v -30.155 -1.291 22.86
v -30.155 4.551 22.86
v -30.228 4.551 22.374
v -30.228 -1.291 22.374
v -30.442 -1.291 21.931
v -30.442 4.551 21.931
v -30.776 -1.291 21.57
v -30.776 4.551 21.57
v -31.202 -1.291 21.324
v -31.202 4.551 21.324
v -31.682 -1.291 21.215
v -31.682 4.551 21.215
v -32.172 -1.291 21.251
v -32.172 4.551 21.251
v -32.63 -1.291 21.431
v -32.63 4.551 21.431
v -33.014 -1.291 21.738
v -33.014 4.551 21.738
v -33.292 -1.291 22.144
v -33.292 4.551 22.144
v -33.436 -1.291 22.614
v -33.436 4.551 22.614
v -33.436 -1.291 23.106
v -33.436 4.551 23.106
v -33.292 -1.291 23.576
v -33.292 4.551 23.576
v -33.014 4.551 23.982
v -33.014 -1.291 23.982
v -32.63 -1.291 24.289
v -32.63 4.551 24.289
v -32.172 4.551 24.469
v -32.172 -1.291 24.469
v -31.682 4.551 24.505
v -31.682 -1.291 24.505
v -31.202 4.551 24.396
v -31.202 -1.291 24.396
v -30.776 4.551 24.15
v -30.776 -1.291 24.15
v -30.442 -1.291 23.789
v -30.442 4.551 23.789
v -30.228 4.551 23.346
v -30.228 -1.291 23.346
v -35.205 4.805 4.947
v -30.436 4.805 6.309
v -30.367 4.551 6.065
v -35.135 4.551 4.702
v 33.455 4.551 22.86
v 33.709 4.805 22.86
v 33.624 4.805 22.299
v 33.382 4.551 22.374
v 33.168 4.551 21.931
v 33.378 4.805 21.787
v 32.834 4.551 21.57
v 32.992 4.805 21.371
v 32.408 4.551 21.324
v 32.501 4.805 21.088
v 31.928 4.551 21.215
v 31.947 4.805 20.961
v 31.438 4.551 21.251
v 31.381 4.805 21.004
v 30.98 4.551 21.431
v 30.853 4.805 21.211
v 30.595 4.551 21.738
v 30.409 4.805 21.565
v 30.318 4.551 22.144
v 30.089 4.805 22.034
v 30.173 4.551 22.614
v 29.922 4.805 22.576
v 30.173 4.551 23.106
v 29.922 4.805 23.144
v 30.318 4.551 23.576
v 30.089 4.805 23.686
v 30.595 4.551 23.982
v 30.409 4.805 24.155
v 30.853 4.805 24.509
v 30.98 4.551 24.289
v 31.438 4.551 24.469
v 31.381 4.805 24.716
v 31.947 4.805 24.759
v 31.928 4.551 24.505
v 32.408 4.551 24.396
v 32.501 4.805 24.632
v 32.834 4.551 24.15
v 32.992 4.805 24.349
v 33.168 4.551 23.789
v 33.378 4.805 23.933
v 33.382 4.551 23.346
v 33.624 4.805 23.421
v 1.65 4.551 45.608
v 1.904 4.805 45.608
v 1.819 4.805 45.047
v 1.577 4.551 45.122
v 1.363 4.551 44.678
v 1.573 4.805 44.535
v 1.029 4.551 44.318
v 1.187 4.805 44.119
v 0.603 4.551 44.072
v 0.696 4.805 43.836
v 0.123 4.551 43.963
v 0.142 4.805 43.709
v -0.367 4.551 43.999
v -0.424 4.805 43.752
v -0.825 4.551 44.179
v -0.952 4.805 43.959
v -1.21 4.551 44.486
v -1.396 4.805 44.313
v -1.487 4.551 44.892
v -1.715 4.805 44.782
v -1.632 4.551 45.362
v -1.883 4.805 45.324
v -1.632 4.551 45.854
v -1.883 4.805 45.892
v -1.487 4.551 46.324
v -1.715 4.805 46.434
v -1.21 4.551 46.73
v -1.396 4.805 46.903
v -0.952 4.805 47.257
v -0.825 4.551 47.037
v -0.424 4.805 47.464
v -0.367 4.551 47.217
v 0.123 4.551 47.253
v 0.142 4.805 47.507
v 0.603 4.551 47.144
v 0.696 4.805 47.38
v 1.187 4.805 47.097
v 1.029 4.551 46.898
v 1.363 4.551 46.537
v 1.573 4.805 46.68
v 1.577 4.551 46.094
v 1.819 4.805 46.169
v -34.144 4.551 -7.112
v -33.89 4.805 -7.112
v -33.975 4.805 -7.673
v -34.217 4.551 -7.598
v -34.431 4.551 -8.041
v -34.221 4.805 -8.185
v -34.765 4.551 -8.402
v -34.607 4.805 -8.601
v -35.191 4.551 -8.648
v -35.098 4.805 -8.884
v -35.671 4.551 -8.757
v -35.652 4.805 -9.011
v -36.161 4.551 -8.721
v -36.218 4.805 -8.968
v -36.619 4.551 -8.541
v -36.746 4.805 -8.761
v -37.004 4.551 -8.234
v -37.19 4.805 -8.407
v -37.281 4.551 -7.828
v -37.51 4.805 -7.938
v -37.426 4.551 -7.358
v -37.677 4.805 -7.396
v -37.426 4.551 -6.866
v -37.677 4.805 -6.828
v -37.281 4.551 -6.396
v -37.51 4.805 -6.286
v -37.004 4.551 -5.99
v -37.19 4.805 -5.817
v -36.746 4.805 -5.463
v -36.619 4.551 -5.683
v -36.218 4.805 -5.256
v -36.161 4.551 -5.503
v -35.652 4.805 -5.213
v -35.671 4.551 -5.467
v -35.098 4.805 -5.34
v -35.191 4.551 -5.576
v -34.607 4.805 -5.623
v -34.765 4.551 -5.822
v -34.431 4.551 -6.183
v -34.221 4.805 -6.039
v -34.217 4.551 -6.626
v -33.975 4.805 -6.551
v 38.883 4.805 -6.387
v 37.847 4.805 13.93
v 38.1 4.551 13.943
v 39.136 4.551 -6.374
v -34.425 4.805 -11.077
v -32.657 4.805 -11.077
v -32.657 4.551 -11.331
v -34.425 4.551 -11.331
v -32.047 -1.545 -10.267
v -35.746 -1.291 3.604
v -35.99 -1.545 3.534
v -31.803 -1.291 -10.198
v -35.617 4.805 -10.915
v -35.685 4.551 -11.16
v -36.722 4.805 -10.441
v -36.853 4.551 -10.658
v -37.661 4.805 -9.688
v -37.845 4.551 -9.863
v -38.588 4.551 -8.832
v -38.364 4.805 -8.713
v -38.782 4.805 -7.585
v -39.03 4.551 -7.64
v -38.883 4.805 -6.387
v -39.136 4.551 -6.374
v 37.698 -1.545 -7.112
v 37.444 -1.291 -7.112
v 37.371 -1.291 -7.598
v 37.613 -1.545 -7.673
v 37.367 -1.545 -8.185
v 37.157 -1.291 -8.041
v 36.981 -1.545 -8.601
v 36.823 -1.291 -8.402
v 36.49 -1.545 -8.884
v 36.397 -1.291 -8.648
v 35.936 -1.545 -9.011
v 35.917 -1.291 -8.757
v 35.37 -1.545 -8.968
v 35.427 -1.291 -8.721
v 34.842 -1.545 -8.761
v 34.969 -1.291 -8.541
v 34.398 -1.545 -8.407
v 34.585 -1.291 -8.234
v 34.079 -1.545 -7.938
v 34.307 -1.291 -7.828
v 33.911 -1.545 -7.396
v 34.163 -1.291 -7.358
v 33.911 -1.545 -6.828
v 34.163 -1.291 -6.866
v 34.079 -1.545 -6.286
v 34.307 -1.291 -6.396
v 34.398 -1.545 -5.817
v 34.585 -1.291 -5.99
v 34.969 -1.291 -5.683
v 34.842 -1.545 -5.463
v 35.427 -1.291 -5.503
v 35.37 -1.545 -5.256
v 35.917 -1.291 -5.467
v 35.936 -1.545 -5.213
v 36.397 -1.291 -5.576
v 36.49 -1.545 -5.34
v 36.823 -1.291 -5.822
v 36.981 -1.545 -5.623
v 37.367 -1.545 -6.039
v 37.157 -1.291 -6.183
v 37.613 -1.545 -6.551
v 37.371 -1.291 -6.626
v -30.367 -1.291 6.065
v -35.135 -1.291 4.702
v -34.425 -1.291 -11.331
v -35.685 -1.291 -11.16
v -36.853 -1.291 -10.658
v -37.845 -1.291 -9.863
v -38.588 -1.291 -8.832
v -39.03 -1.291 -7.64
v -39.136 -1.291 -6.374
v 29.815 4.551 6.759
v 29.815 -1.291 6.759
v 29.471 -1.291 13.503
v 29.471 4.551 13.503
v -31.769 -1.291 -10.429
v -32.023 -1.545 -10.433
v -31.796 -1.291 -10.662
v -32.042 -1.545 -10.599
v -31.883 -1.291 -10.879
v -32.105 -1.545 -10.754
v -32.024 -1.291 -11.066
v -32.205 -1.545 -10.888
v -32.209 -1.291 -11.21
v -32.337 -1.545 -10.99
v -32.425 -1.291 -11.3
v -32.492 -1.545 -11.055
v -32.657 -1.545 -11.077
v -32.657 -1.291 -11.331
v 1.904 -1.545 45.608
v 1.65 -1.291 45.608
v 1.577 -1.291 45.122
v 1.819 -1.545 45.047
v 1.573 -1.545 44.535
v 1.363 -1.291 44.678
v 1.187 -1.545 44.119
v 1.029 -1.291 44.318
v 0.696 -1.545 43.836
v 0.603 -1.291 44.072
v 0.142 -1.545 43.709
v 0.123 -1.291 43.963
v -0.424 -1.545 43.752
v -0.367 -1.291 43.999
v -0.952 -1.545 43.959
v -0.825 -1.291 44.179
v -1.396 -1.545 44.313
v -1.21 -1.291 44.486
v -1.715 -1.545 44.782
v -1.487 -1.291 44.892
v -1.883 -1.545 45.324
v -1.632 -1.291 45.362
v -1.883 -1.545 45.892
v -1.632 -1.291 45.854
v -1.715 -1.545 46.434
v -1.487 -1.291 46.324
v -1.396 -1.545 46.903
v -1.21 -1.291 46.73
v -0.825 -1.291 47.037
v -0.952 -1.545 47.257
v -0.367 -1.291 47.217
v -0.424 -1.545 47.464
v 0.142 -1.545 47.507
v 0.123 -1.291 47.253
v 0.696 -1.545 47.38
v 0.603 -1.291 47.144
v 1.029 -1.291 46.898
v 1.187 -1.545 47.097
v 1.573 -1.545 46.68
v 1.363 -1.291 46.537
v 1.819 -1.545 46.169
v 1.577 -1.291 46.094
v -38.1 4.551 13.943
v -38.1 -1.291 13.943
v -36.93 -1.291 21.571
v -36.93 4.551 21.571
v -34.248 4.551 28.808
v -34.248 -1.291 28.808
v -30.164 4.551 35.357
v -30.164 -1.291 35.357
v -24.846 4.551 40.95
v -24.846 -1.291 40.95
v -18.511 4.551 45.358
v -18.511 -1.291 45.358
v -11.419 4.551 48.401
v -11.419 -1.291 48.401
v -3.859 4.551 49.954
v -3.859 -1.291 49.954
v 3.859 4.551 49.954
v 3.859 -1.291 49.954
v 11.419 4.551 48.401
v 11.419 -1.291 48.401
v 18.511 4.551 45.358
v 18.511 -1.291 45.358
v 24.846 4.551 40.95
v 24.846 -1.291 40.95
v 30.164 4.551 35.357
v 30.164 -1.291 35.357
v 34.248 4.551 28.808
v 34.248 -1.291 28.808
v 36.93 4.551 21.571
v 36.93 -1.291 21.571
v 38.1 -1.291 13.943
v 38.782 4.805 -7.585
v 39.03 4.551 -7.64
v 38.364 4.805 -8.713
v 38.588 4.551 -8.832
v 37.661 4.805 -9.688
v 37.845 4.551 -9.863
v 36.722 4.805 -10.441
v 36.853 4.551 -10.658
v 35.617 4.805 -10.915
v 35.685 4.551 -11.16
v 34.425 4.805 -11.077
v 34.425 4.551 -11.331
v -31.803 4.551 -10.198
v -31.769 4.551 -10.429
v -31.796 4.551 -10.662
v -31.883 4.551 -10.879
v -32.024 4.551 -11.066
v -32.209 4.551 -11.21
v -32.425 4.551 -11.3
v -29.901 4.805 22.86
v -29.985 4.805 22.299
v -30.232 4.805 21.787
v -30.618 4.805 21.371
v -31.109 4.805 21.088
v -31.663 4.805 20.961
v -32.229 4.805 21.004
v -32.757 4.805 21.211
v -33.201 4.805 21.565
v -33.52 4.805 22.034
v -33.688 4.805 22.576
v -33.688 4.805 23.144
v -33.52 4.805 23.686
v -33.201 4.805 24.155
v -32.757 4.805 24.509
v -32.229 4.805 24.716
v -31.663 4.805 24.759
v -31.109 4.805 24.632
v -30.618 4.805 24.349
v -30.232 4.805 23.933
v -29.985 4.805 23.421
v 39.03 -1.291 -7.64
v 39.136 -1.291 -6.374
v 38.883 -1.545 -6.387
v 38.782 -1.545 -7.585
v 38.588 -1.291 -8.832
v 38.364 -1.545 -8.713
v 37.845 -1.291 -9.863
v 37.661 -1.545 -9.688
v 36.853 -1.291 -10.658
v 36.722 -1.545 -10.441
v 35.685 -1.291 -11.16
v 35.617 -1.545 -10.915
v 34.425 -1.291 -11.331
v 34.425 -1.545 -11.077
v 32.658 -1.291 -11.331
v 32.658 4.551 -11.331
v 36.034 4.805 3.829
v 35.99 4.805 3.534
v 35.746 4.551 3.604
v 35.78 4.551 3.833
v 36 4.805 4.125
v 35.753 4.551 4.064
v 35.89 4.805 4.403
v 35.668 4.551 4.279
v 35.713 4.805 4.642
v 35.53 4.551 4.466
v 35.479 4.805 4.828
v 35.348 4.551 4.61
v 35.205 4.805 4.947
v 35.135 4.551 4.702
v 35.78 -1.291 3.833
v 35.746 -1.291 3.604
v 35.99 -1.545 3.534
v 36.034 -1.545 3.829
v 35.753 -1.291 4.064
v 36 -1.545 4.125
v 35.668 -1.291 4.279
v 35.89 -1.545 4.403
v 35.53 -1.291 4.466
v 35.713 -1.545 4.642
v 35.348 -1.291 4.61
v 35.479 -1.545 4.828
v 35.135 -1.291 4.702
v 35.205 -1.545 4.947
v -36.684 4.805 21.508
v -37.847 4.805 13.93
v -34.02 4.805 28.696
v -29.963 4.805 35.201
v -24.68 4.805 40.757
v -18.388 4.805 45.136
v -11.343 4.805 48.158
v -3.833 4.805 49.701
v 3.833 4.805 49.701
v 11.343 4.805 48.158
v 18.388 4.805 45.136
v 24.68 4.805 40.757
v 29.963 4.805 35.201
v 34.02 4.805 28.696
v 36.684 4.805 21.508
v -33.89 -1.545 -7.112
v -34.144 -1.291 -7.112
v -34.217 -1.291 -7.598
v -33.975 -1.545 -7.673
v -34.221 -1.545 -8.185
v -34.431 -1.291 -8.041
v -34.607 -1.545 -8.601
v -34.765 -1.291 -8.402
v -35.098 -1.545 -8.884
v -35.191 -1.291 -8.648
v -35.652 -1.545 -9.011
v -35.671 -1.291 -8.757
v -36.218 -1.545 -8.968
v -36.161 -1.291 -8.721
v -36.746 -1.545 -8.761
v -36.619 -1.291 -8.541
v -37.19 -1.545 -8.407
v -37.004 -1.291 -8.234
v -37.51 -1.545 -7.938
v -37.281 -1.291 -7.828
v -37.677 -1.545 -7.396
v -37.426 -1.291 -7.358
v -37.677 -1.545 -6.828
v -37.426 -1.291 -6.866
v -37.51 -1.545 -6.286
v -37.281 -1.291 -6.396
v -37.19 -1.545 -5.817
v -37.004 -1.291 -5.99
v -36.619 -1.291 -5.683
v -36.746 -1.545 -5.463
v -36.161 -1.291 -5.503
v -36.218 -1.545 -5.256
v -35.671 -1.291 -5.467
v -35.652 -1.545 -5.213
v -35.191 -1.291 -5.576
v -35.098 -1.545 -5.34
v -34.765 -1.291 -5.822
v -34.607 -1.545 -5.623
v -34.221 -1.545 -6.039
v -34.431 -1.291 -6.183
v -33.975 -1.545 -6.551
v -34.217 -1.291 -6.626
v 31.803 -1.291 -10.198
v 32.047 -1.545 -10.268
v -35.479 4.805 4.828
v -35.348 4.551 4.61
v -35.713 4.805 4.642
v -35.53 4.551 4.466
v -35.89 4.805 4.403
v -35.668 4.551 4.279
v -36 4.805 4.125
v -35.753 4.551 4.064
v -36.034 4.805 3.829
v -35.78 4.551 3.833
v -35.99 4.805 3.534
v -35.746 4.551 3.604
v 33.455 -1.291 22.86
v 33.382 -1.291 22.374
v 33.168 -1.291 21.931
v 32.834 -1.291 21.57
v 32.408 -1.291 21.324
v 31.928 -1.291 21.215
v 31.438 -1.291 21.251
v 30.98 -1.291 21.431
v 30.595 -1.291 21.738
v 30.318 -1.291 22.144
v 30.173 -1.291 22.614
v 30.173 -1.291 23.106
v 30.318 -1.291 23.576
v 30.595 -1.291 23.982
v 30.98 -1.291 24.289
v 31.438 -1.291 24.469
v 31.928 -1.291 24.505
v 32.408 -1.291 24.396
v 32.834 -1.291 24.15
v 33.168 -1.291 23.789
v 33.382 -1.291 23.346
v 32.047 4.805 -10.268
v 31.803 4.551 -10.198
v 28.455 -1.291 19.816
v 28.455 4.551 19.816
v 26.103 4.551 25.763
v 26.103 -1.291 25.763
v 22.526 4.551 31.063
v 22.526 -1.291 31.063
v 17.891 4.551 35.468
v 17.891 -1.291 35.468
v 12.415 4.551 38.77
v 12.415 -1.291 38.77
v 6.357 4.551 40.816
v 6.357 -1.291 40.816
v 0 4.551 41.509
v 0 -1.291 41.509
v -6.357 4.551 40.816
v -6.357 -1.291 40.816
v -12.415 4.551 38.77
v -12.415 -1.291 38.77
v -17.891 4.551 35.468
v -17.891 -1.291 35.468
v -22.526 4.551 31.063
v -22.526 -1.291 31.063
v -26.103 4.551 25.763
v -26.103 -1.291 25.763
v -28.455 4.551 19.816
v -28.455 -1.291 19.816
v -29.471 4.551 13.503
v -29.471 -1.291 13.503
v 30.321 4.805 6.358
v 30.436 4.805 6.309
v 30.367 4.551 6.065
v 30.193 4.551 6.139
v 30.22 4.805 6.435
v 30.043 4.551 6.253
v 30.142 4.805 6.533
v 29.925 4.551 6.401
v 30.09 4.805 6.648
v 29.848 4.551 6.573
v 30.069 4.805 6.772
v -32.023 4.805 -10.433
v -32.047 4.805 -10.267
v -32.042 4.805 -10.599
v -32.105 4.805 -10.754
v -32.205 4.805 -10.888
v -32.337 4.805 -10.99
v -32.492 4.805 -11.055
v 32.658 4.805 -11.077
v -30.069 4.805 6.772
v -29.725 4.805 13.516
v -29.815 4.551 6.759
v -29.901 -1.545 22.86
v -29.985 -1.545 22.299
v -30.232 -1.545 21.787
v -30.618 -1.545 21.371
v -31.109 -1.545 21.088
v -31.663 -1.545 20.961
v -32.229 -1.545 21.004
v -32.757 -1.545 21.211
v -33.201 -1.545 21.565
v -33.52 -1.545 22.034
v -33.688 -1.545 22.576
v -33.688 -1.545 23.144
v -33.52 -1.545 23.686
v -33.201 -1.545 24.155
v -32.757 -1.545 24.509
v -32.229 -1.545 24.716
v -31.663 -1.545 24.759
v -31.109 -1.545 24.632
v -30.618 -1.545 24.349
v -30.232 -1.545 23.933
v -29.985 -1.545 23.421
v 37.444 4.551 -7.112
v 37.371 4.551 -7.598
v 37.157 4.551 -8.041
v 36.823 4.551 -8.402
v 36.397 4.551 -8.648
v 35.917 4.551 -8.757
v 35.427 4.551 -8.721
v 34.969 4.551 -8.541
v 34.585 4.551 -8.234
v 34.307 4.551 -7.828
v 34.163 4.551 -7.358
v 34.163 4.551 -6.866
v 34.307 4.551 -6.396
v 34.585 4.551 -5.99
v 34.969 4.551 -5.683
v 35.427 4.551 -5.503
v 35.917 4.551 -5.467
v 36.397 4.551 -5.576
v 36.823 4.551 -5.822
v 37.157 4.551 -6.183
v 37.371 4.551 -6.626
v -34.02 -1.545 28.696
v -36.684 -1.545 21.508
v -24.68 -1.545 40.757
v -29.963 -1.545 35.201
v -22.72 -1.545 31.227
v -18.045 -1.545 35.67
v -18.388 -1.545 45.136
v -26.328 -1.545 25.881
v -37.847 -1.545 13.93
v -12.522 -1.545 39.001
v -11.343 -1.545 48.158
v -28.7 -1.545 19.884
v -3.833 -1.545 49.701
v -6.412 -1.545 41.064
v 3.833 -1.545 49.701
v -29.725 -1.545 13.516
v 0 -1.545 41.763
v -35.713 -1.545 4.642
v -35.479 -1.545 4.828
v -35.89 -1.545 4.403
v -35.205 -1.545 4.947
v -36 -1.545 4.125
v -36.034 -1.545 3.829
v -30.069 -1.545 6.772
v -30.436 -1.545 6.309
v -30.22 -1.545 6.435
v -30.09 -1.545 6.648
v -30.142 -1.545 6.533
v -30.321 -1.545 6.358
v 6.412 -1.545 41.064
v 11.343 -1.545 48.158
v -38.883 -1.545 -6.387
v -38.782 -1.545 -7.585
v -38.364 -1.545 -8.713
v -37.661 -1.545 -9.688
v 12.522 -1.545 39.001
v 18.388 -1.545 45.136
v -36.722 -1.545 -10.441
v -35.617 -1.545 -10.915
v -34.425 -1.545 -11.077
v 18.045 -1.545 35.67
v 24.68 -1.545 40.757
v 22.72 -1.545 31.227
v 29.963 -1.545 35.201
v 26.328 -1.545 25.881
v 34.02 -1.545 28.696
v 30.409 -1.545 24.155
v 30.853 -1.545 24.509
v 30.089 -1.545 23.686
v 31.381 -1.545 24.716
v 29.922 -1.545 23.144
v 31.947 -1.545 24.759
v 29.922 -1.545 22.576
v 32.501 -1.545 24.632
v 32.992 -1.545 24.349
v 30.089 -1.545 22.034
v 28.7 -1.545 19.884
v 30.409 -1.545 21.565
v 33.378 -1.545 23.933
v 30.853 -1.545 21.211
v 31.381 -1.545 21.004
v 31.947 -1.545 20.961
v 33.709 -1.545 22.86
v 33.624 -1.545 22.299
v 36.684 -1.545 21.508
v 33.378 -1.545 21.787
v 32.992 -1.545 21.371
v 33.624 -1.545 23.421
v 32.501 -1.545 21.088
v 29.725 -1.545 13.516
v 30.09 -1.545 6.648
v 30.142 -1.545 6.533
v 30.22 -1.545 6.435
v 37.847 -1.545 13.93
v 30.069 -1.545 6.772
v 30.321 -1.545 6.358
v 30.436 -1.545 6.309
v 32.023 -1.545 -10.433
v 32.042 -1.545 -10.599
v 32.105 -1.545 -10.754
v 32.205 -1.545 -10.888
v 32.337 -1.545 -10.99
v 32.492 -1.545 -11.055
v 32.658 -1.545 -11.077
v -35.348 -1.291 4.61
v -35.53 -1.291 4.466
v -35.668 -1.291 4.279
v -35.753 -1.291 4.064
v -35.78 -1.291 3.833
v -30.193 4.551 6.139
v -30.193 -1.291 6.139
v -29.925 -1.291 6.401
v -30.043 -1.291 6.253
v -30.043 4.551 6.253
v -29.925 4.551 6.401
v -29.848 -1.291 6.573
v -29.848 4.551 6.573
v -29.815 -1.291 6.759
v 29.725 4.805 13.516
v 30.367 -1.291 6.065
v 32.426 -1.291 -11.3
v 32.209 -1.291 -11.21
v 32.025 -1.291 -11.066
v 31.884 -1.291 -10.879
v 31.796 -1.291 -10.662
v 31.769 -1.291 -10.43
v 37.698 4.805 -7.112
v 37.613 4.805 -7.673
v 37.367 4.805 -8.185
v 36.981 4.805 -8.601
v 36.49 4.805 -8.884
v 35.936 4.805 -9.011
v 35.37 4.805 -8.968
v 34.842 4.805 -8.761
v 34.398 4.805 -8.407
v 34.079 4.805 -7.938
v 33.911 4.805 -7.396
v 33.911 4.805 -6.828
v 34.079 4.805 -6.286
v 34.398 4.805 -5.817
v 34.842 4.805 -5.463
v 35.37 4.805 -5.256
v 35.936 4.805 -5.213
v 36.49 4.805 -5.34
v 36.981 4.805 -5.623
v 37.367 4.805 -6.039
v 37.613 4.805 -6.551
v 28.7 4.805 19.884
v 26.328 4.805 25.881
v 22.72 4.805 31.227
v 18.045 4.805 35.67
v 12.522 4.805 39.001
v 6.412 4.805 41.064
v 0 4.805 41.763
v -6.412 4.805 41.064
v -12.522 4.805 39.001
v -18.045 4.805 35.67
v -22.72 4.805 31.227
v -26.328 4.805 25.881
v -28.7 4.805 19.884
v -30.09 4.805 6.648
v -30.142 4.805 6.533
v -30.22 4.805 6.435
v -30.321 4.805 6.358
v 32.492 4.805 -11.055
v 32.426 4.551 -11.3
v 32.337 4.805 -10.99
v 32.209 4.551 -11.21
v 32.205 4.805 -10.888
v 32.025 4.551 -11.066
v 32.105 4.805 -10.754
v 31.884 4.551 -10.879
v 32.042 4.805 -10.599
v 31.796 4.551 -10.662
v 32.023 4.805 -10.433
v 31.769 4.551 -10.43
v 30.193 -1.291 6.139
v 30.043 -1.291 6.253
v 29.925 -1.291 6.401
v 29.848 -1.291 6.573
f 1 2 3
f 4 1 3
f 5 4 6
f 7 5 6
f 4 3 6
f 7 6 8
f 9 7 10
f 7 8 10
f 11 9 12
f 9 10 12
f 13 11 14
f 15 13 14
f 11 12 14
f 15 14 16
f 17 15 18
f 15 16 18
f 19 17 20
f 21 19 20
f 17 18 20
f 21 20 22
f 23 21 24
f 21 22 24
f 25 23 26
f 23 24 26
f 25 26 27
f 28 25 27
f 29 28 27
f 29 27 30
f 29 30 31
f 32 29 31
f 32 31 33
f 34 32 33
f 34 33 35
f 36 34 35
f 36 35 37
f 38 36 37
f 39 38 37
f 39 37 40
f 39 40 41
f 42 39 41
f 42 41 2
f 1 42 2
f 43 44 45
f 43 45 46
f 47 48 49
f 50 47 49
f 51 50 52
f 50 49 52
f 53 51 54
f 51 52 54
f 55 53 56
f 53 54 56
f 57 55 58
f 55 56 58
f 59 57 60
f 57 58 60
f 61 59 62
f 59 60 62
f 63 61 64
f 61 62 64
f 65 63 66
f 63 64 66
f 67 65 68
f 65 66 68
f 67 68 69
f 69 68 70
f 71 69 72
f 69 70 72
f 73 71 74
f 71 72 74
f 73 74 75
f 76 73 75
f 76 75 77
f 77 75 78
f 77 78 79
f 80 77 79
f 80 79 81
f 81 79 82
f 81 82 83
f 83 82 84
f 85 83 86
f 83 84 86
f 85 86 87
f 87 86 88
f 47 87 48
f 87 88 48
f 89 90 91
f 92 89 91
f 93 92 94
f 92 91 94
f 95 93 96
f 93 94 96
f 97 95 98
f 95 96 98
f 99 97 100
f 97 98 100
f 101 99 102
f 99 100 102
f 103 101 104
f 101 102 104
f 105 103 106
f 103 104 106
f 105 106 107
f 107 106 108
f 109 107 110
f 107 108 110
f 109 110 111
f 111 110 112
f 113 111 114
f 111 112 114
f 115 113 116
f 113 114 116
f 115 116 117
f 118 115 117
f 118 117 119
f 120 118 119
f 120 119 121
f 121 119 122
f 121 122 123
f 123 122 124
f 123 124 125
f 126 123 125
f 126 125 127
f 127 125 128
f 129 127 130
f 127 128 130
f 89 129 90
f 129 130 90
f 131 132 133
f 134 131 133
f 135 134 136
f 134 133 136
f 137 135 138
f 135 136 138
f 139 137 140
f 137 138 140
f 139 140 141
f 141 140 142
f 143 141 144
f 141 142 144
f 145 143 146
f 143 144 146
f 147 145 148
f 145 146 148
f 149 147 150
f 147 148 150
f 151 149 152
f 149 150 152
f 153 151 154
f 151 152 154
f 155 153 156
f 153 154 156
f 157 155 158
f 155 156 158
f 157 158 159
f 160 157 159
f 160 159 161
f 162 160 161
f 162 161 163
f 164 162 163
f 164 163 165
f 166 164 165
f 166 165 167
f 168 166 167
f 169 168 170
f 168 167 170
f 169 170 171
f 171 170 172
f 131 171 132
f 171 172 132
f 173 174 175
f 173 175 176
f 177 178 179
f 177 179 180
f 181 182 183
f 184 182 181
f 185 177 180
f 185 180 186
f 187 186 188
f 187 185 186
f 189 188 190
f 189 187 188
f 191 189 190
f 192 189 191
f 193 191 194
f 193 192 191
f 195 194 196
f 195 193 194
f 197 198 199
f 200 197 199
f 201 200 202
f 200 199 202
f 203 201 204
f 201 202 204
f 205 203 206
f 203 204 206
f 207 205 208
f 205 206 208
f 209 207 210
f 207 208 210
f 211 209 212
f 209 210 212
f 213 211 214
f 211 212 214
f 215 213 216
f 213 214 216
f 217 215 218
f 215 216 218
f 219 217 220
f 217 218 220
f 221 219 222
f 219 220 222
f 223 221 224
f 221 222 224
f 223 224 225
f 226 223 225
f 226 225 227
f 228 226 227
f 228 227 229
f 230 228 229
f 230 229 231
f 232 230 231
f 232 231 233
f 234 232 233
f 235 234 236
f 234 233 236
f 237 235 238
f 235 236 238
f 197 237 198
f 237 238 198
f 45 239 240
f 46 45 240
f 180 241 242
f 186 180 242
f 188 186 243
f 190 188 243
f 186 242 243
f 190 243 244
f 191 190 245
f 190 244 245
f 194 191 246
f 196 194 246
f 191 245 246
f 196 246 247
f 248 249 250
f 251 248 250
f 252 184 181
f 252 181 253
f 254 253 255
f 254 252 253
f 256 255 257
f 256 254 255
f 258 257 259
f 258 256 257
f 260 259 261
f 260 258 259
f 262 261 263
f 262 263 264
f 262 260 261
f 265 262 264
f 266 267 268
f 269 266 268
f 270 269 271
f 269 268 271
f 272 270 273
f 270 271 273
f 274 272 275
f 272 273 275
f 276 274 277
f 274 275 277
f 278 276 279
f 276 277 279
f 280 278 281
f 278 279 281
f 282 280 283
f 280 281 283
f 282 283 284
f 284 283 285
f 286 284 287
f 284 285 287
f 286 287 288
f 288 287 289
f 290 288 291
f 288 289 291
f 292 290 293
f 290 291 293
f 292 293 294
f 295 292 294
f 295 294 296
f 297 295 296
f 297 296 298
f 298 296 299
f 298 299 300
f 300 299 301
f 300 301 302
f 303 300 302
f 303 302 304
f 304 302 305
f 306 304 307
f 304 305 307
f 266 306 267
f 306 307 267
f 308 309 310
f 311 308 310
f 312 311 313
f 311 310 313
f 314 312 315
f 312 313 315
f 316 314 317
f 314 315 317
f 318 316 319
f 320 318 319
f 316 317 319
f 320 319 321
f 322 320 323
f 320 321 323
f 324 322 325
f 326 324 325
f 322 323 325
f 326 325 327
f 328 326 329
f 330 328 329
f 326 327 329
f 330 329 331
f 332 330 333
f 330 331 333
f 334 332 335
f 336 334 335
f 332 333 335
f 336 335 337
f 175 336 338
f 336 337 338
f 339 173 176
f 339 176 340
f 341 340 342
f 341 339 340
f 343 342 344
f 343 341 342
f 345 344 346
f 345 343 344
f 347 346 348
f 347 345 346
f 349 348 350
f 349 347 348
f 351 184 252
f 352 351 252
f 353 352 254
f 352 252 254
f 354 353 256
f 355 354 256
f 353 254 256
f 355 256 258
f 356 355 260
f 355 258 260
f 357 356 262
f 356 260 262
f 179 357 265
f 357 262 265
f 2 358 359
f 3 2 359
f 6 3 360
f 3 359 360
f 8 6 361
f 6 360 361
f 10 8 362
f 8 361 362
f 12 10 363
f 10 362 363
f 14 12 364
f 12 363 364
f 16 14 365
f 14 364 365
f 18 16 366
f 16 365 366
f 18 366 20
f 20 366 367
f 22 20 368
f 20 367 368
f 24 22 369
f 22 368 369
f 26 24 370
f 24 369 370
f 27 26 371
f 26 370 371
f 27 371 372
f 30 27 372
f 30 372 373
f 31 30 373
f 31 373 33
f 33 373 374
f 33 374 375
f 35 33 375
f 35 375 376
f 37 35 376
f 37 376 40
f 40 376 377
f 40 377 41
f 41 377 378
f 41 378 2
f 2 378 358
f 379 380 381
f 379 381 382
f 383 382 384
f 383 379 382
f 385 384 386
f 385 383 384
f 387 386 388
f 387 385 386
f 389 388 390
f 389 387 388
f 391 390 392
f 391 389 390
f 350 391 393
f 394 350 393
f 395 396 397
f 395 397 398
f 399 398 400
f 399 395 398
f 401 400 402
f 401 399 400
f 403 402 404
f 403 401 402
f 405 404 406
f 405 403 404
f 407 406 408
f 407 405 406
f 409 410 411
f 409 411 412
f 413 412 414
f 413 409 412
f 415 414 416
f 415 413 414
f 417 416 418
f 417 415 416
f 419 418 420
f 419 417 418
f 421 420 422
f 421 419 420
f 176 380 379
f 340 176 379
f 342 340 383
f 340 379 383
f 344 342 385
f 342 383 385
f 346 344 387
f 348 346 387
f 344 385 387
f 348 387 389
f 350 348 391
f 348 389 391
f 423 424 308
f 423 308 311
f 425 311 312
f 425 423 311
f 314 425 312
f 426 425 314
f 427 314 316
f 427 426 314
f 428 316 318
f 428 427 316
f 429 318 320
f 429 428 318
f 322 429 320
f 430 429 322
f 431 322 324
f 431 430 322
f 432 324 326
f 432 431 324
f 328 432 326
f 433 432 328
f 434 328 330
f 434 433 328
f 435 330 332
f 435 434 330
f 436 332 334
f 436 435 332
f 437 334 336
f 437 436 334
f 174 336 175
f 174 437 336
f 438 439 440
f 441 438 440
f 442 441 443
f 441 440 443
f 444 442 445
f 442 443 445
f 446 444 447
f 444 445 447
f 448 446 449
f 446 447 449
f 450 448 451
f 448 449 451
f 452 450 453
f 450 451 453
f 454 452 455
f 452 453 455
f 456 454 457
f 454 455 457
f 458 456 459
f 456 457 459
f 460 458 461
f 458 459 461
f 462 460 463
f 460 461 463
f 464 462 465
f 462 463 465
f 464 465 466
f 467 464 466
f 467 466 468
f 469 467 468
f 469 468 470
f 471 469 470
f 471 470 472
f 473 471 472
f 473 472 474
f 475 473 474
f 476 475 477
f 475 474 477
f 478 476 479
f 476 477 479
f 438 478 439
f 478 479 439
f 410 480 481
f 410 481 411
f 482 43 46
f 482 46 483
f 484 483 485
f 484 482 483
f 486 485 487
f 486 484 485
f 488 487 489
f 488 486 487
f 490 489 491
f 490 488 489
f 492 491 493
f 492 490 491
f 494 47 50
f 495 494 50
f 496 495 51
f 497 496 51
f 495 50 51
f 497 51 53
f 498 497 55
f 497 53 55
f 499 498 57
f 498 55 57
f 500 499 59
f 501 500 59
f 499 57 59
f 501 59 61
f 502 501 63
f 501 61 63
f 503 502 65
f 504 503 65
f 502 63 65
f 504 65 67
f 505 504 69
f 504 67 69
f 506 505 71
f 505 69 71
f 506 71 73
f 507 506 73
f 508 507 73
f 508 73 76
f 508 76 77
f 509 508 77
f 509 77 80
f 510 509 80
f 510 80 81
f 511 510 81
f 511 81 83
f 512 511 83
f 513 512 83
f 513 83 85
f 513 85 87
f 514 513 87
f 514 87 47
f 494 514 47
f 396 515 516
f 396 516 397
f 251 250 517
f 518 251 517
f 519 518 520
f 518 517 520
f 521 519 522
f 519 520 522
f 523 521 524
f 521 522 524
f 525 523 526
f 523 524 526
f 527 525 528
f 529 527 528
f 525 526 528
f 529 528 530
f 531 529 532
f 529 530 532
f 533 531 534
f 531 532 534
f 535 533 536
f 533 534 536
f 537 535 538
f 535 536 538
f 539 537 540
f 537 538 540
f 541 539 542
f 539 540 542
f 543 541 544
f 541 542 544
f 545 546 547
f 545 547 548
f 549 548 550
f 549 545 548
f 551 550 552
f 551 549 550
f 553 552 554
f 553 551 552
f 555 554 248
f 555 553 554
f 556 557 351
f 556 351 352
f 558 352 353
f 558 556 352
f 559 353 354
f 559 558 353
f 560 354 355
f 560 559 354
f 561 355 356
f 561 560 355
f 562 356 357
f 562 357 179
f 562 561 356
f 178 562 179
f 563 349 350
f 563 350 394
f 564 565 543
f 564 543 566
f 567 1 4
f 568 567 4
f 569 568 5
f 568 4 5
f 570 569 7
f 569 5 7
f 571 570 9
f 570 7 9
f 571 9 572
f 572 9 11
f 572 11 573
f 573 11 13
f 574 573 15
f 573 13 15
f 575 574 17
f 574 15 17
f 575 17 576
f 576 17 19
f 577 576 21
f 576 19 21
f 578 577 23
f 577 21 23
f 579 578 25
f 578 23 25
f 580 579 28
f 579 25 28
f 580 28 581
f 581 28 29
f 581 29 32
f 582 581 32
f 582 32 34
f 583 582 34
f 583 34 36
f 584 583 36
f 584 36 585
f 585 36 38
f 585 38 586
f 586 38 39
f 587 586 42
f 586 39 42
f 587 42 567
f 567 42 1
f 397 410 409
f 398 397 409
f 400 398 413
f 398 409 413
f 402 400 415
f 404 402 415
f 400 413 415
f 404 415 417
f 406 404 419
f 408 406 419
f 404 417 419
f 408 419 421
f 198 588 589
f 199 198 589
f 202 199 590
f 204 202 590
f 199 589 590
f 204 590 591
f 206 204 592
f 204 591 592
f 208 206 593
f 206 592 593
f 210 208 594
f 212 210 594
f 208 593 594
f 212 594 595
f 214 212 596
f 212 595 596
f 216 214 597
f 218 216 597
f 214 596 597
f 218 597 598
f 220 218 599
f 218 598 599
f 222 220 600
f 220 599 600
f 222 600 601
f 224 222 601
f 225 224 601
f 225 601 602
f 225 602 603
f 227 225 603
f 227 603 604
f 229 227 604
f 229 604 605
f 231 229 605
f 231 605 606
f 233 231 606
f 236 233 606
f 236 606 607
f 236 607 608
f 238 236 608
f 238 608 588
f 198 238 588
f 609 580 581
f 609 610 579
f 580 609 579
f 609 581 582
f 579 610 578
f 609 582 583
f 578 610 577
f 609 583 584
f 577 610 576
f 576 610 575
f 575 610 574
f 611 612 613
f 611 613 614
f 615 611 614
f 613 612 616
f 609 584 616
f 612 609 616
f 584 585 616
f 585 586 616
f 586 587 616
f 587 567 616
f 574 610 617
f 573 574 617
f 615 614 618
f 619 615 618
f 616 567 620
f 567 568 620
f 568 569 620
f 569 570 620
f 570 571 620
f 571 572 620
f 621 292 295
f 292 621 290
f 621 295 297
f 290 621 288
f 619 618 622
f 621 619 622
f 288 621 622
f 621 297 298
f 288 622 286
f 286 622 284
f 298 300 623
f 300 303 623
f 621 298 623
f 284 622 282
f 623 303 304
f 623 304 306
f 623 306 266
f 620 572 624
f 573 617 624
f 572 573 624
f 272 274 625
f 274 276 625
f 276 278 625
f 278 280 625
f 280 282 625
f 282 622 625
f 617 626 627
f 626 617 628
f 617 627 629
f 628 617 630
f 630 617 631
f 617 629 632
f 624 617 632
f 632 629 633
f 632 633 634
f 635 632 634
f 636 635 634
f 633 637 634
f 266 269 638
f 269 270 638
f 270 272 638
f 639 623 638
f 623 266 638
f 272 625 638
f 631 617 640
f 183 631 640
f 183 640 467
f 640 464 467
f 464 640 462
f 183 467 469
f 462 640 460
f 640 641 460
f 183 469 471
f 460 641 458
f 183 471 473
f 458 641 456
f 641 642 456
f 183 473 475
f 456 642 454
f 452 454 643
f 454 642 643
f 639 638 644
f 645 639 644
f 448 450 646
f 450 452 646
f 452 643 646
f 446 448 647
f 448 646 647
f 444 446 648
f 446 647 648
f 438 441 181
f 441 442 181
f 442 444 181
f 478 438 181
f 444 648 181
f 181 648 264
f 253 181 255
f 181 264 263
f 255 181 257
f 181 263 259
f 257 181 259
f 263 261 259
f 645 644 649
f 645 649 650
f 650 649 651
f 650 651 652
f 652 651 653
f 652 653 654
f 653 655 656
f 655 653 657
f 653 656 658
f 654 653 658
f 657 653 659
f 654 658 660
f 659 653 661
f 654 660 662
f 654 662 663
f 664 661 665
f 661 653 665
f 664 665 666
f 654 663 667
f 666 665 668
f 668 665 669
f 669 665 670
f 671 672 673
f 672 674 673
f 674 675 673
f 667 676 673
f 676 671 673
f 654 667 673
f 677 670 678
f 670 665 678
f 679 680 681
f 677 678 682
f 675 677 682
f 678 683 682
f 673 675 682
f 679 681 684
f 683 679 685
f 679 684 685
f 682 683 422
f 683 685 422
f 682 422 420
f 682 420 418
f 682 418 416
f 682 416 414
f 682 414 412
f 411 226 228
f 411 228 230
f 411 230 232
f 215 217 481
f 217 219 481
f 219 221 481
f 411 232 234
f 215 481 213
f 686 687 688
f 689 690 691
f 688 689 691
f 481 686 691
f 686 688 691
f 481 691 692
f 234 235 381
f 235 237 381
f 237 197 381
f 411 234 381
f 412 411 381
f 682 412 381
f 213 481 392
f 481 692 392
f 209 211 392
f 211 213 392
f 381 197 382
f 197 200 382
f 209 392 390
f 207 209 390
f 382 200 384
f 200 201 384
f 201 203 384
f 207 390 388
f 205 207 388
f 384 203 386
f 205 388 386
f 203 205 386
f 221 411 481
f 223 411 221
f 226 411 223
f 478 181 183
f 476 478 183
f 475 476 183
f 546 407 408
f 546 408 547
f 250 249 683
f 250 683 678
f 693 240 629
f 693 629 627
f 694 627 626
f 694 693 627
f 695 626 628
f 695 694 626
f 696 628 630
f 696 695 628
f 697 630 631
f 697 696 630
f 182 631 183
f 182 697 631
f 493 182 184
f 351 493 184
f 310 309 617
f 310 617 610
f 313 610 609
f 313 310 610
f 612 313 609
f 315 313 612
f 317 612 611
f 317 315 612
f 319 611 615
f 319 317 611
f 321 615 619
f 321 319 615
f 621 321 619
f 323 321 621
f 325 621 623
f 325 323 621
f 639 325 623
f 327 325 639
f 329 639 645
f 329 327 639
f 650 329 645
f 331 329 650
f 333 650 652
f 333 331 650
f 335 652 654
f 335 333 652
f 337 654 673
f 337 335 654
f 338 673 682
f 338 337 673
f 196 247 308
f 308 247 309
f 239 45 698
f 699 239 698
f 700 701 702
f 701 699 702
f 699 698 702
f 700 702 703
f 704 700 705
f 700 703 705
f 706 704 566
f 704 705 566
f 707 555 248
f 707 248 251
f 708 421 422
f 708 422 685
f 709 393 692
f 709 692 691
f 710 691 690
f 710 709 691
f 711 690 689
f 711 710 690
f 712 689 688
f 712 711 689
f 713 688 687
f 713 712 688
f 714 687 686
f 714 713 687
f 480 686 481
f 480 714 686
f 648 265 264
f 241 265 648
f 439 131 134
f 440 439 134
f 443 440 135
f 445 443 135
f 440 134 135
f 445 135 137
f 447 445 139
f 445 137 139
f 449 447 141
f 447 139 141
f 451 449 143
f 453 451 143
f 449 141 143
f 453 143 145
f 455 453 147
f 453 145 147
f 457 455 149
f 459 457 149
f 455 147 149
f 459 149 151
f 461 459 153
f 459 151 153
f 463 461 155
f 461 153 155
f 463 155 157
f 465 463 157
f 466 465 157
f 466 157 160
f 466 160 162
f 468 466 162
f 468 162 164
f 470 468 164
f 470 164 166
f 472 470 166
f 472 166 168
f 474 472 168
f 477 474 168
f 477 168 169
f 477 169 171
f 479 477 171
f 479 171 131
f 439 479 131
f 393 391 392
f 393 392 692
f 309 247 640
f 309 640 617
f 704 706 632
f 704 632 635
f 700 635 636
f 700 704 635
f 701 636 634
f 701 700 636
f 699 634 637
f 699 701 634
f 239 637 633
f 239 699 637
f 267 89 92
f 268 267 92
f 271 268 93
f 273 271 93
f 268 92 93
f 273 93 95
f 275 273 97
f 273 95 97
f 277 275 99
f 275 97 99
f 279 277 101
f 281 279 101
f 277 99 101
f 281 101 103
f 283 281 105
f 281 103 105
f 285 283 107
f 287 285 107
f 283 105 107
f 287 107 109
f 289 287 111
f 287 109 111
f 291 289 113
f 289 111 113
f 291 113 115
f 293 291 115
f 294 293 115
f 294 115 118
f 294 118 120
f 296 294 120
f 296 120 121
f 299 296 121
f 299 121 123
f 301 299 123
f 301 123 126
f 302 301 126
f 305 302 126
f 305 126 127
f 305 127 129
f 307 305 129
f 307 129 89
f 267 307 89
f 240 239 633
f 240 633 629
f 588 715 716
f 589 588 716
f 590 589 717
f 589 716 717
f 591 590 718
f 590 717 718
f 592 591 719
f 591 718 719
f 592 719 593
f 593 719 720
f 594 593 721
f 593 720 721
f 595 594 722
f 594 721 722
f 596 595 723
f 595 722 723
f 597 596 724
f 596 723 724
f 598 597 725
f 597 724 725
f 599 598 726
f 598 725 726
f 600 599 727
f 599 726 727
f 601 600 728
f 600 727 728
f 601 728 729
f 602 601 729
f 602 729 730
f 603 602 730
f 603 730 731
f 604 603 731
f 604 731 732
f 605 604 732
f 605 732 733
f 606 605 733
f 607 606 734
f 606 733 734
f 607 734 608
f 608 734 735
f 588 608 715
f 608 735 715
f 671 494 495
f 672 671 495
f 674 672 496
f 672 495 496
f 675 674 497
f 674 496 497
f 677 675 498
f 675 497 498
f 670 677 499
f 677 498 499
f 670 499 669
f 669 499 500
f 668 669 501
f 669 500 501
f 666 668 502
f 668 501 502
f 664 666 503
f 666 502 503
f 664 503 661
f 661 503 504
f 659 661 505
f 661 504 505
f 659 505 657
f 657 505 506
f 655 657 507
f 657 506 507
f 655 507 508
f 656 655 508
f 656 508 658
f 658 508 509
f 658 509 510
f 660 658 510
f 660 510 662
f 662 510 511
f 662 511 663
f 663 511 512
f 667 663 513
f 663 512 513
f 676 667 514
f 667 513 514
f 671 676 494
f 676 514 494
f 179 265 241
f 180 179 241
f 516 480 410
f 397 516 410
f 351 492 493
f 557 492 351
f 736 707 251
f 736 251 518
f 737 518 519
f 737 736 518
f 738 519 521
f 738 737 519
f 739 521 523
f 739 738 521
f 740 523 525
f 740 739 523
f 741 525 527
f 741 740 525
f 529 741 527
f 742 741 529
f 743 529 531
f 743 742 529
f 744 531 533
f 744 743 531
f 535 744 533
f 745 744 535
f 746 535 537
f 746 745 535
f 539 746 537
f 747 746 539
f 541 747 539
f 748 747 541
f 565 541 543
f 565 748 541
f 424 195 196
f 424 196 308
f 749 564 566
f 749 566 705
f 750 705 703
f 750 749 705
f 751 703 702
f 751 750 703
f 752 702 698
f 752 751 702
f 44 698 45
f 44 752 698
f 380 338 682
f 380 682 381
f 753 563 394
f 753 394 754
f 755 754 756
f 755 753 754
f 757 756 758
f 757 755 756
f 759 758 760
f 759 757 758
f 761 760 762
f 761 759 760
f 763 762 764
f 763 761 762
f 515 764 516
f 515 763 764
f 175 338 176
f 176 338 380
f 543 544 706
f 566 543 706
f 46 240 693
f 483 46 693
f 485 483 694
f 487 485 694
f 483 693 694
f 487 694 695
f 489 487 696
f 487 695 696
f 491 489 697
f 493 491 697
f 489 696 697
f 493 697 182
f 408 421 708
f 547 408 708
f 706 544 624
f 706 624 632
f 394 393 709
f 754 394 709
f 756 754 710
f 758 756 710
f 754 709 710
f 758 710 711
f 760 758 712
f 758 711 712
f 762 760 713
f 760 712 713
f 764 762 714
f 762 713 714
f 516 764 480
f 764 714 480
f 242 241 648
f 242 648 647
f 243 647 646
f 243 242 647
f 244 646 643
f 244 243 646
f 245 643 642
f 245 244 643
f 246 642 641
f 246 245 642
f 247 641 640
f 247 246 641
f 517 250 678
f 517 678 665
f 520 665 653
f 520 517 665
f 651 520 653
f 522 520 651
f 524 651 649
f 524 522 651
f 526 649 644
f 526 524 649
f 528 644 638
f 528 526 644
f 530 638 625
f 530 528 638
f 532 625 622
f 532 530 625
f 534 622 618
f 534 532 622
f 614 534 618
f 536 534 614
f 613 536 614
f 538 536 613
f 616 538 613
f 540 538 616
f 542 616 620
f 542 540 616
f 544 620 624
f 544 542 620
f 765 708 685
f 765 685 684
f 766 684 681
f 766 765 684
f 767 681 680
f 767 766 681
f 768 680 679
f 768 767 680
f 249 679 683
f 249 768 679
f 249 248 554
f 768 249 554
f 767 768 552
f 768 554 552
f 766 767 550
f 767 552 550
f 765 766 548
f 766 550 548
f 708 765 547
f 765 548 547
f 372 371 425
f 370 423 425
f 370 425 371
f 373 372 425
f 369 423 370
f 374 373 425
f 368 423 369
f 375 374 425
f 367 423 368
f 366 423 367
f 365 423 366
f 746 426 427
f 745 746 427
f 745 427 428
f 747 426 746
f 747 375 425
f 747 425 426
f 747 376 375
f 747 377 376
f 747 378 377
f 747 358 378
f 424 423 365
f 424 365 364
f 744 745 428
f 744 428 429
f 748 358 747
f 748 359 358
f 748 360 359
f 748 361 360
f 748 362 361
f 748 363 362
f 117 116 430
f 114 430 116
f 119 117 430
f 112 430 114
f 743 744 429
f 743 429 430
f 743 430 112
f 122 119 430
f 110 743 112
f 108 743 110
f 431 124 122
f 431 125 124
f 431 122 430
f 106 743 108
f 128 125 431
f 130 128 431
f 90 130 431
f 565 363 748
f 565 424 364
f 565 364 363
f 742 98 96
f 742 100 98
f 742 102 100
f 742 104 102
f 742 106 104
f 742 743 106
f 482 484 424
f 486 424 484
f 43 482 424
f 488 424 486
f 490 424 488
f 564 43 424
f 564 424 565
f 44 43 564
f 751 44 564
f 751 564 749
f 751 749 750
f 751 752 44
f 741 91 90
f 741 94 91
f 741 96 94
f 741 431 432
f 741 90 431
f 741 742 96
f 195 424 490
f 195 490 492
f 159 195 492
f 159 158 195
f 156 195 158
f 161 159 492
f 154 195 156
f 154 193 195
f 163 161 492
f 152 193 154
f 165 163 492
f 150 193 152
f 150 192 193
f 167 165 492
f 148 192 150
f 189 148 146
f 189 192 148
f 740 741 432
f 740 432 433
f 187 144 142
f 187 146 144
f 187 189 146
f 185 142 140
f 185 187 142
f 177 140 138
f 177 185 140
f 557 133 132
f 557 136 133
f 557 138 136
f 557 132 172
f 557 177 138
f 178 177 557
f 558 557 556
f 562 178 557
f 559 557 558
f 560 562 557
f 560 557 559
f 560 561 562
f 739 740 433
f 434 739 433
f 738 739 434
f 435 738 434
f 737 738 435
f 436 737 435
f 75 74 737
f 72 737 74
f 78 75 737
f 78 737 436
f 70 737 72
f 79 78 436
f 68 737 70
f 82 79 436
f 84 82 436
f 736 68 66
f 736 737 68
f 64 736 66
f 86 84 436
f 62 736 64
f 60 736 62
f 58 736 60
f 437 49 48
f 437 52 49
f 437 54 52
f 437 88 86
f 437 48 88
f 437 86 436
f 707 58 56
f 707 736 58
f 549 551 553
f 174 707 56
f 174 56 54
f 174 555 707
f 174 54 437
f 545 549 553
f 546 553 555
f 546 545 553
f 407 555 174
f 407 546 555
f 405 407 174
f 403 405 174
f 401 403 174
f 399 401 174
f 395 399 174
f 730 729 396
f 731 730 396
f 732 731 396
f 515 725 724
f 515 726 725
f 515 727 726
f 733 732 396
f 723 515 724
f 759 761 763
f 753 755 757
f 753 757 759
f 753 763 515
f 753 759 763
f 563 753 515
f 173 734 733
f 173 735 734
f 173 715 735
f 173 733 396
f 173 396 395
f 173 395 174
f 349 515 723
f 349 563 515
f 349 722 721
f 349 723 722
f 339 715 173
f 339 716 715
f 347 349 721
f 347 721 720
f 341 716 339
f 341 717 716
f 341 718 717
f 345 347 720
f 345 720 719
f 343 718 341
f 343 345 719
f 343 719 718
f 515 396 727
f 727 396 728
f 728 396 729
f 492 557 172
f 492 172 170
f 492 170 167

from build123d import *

# Parameters (mm, degrees)
BOSS_EXTRUDE1_DEPTH   = 6.35
M4X0_7_TAPPED_HOLE1_D = 3.3
MOVE_START            = -1.5452
MOVE_FACE1_DEPTH      = 6.35
FILLET1_R             = 0.762
CHAMFER1_SIZE         = 0.254


# Read off the part's stored shape, not the designer's step: Move Face1
with BuildPart() as part:
    # Sketch1 → Boss-Extrude1 (new body)
    with BuildSketch(Plane(origin=(0, -1.5452, 0), x_dir=(1, 0, 0), z_dir=(0, 1, 0))):
        with BuildLine():
            Line((-38.502216327, 6.405933187), (-37.466084693, -13.910736196))
            ThreePointArc((-37.466084693, -13.910736196), (0, -49.514775956), (37.466084693, -13.910736196))
            Line((37.466084693, -13.910736196), (38.502216327, 6.405933187))
            ThreePointArc((38.502216327, 6.405933187), (37.384487444, 9.425866669), (34.42540277, 10.695958786))
            Line((34.42540277, 10.695958786), (32.657493289, 10.695958786))
            ThreePointArc((32.657493289, 10.695958786), (32.454748459, 10.594968738), (32.41333978, 10.372281116))
            Line((32.41333978, 10.372281116), (36.356433895, -3.429162442))
            ThreePointArc((36.356433895, -3.429162442), (36.223319367, -4.587824739), (35.309857101, -5.312948512))
            Line((35.309857101, -5.312948512), (30.453700202, -6.70036017))
            Line((30.453700202, -6.70036017), (30.10512277, -13.535333842))
            ThreePointArc((30.10512277, -13.535333842), (0, -42.14424766), (-30.10512277, -13.535333842))
            Line((-30.10512277, -13.535333842), (-30.453700202, -6.70036017))
            Line((-30.453700202, -6.70036017), (-35.309857101, -5.312948512))
            ThreePointArc((-35.309857101, -5.312948512), (-36.223319367, -4.587824739), (-36.356433895, -3.429162442))
            Line((-36.356433895, -3.429162442), (-32.41333978, 10.372281116))
            ThreePointArc((-32.41333978, 10.372281116), (-32.454748459, 10.594968738), (-32.657493289, 10.695958786))
            Line((-32.657493289, 10.695958786), (-34.42540277, 10.695958786))
            ThreePointArc((-34.42540277, 10.695958786), (-37.384487444, 9.425866669), (-38.502216327, 6.405933187))
        make_face()
    extrude(amount=BOSS_EXTRUDE1_DEPTH)

    # M4x0.7 Tapped Hole1 (through all)
    with Locations(Plane(origin=(0, -1.5452, 0), x_dir=(-1, 0, 0), z_dir=(0, -1, 0))):
        with Locations((31.804908667, -22.86), (35.794080898, 7.112), (0, -45.607912987), (-31.804908667, -22.86), (-35.794080898, 7.112)):
            Hole(M4X0_7_TAPPED_HOLE1_D / 2)

    # Move Face1 outline → Move Face1 (add)
    with BuildSketch(Plane(origin=(0, 0, 0), x_dir=(1, 0, 0), z_dir=(0, 1, 0)).offset(MOVE_START)):
        with BuildLine():
            ThreePointArc((-34.42540277, 11.330958786), (-37.844793004, 9.863295282), (-39.136392147, 6.373590798))
            Line((-39.136392147, 6.373590798), (-38.100260512, -13.943078585))
            ThreePointArc((-38.100260512, -13.943078585), (0, -50.149775956), (38.100260512, -13.943078585))
            Line((38.100260512, -13.943078585), (39.136392147, 6.373590798))
            ThreePointArc((39.136392147, 6.373590798), (37.844793004, 9.863295282), (34.42540277, 11.330958786))
            Line((34.42540277, 11.330958786), (32.657662642, 11.330958764))
            ThreePointArc((32.657662642, 11.330958764), (31.94785031, 10.977433467), (31.802770017, 10.197840375))
            Line((31.802770017, 10.197840375), (35.745873307, -3.603635272))
            ThreePointArc((35.745873307, -3.603635272), (35.668225017, -4.27944954), (35.135416361, -4.702378753))
            Line((35.135416361, -4.702378753), (29.842651852, -6.214529893))
            Line((29.842651852, -6.214529893), (29.47094695, -13.502991453))
            ThreePointArc((29.47094695, -13.502991453), (0, -41.50924766), (-29.47094695, -13.502991453))
            Line((-29.47094695, -13.502991453), (-29.842651852, -6.214529893))
            Line((-29.842651852, -6.214529893), (-35.135448453, -4.702369587))
            ThreePointArc((-35.135448453, -4.702369587), (-35.668241226, -4.279420366), (-35.745864137, -3.603603182))
            Line((-35.745864137, -3.603603182), (-31.802816567, 10.197677545))
            ThreePointArc((-31.802816567, 10.197677545), (-31.947748326, 10.977298265), (-32.657493289, 11.330958793))
            Line((-32.657493289, 11.330958793), (-34.42540277, 11.330958786))
        make_face()
        with BuildLine():
            Line((-37.466084693, -13.910736196), (-38.502216327, 6.405933187))
            ThreePointArc((-38.502216327, 6.405933187), (-37.384487444, 9.425866669), (-34.42540277, 10.695958786))
            Line((-34.42540277, 10.695958786), (-32.657493289, 10.695958786))
            ThreePointArc((-32.657493289, 10.695958786), (-32.454748459, 10.594968738), (-32.41333978, 10.372281116))
            Line((-32.41333978, 10.372281116), (-36.356433895, -3.429162442))
            ThreePointArc((-36.356433895, -3.429162442), (-36.223319367, -4.587824739), (-35.309857101, -5.312948512))
            Line((-35.309857101, -5.312948512), (-30.453700202, -6.70036017))
            Line((-30.453700202, -6.70036017), (-30.10512277, -13.535333842))
            ThreePointArc((-30.10512277, -13.535333842), (0, -42.14424766), (30.10512277, -13.535333842))
            Line((30.10512277, -13.535333842), (30.453700202, -6.70036017))
            Line((30.453700202, -6.70036017), (35.309857101, -5.312948512))
            ThreePointArc((35.309857101, -5.312948512), (36.223319367, -4.587824739), (36.356433895, -3.429162442))
            Line((36.356433895, -3.429162442), (32.41333978, 10.372281116))
            ThreePointArc((32.41333978, 10.372281116), (32.454748459, 10.594968738), (32.657493289, 10.695958786))
            Line((32.657493289, 10.695958786), (34.42540277, 10.695958786))
            ThreePointArc((34.42540277, 10.695958786), (37.384487444, 9.425866669), (38.502216327, 6.405933187))
            Line((38.502216327, 6.405933187), (37.466084693, -13.910736196))
            ThreePointArc((37.466084693, -13.910736196), (0, -49.514775956), (-37.466084693, -13.910736196))
        make_face(mode=Mode.SUBTRACT)
    extrude(amount=MOVE_FACE1_DEPTH)

    # Fillet1
    fillet1_edges = [part.edges().sort_by_distance(p)[0] for p in [
        (-29.842651852, 1.6298, 6.214529893),
        (29.842651852, 1.6298, 6.214529893),
    ]]
    fillet(fillet1_edges, radius=FILLET1_R)

    # Chamfer1
    chamfer1_edges = [part.edges().sort_by_distance(p)[0] for p in [
        (0, 4.8048, 50.149775956),
        (38.61832633, 4.8048, 3.784743893),
        (-33.54144803, -1.5452, -11.33095879),
        (37.844793004, 4.8048, -9.863295282),
        (-31.947748326, -1.5452, -10.977298265),
        (-33.774340352, -1.5452, -3.297037181),
        (-35.668241226, -1.5452, 4.279420366),
        (-29.642922919, -1.5452, 10.130853406),
        (0, -1.5452, 41.50924766),
        (32.750998673, -1.5452, 5.383610635),
        (33.541532706, 4.8048, -11.330958775),
        (35.668225017, -1.5452, 4.27944954),
        (33.774321662, -1.5452, -3.297102552),
        (31.94785031, -1.5452, -10.977433467),
        (33.541532706, -1.5452, -11.330958775),
        (37.844793004, -1.5452, -9.863295282),
        (38.61832633, -1.5452, 3.784743893),
        (0, -1.5452, 50.149775956),
        (31.94785031, 4.8048, -10.977433467),
        (-38.61832633, -1.5452, 3.784743893),
        (-37.844793004, -1.5452, -9.863295282),
        (33.774321662, 4.8048, -3.297102552),
        (35.668225017, 4.8048, 4.27944954),
        (32.750998673, 4.8048, 5.383610635),
        (0, 4.8048, 41.50924766),
        (-37.844793004, 4.8048, -9.863295282),
        (-29.642922919, 4.8048, 10.130853406),
        (-35.668241226, 4.8048, 4.279420366),
        (-33.774340352, 4.8048, -3.297037181),
        (-31.947748326, 4.8048, -10.977298265),
        (34.144080898, -1.5452, -7.112),
        (34.144080898, 4.8048, -7.112),
        (-33.54144803, 4.8048, -11.33095879),
        (30.154908667, -1.5452, 22.86),
        (30.154908667, 4.8048, 22.86),
        (-1.65, -1.5452, 45.607912987),
        (-1.65, 4.8048, 45.607912987),
        (-37.444080898, -1.5452, -7.112),
        (-37.444080898, 4.8048, -7.112),
        (-38.61832633, 4.8048, 3.784743893),
        (-33.454908667, -1.5452, 22.86),
        (-33.454908667, 4.8048, 22.86),
        (-32.751014719, -1.5452, 5.383606052),
        (-32.751014719, 4.8048, 5.383606052),
        (29.642922919, -1.5452, 10.130853405),
        (29.979458075, -1.5452, 6.323301327),
        (-29.979458075, -1.5452, 6.323301327),
        (29.642922919, 4.8048, 10.130853405),
        (29.979458075, 4.8048, 6.323301327),
        (-29.979458075, 4.8048, 6.323301327),
    ]]
    chamfer(chamfer1_edges, length=CHAMFER1_SIZE)


solid = part.part
